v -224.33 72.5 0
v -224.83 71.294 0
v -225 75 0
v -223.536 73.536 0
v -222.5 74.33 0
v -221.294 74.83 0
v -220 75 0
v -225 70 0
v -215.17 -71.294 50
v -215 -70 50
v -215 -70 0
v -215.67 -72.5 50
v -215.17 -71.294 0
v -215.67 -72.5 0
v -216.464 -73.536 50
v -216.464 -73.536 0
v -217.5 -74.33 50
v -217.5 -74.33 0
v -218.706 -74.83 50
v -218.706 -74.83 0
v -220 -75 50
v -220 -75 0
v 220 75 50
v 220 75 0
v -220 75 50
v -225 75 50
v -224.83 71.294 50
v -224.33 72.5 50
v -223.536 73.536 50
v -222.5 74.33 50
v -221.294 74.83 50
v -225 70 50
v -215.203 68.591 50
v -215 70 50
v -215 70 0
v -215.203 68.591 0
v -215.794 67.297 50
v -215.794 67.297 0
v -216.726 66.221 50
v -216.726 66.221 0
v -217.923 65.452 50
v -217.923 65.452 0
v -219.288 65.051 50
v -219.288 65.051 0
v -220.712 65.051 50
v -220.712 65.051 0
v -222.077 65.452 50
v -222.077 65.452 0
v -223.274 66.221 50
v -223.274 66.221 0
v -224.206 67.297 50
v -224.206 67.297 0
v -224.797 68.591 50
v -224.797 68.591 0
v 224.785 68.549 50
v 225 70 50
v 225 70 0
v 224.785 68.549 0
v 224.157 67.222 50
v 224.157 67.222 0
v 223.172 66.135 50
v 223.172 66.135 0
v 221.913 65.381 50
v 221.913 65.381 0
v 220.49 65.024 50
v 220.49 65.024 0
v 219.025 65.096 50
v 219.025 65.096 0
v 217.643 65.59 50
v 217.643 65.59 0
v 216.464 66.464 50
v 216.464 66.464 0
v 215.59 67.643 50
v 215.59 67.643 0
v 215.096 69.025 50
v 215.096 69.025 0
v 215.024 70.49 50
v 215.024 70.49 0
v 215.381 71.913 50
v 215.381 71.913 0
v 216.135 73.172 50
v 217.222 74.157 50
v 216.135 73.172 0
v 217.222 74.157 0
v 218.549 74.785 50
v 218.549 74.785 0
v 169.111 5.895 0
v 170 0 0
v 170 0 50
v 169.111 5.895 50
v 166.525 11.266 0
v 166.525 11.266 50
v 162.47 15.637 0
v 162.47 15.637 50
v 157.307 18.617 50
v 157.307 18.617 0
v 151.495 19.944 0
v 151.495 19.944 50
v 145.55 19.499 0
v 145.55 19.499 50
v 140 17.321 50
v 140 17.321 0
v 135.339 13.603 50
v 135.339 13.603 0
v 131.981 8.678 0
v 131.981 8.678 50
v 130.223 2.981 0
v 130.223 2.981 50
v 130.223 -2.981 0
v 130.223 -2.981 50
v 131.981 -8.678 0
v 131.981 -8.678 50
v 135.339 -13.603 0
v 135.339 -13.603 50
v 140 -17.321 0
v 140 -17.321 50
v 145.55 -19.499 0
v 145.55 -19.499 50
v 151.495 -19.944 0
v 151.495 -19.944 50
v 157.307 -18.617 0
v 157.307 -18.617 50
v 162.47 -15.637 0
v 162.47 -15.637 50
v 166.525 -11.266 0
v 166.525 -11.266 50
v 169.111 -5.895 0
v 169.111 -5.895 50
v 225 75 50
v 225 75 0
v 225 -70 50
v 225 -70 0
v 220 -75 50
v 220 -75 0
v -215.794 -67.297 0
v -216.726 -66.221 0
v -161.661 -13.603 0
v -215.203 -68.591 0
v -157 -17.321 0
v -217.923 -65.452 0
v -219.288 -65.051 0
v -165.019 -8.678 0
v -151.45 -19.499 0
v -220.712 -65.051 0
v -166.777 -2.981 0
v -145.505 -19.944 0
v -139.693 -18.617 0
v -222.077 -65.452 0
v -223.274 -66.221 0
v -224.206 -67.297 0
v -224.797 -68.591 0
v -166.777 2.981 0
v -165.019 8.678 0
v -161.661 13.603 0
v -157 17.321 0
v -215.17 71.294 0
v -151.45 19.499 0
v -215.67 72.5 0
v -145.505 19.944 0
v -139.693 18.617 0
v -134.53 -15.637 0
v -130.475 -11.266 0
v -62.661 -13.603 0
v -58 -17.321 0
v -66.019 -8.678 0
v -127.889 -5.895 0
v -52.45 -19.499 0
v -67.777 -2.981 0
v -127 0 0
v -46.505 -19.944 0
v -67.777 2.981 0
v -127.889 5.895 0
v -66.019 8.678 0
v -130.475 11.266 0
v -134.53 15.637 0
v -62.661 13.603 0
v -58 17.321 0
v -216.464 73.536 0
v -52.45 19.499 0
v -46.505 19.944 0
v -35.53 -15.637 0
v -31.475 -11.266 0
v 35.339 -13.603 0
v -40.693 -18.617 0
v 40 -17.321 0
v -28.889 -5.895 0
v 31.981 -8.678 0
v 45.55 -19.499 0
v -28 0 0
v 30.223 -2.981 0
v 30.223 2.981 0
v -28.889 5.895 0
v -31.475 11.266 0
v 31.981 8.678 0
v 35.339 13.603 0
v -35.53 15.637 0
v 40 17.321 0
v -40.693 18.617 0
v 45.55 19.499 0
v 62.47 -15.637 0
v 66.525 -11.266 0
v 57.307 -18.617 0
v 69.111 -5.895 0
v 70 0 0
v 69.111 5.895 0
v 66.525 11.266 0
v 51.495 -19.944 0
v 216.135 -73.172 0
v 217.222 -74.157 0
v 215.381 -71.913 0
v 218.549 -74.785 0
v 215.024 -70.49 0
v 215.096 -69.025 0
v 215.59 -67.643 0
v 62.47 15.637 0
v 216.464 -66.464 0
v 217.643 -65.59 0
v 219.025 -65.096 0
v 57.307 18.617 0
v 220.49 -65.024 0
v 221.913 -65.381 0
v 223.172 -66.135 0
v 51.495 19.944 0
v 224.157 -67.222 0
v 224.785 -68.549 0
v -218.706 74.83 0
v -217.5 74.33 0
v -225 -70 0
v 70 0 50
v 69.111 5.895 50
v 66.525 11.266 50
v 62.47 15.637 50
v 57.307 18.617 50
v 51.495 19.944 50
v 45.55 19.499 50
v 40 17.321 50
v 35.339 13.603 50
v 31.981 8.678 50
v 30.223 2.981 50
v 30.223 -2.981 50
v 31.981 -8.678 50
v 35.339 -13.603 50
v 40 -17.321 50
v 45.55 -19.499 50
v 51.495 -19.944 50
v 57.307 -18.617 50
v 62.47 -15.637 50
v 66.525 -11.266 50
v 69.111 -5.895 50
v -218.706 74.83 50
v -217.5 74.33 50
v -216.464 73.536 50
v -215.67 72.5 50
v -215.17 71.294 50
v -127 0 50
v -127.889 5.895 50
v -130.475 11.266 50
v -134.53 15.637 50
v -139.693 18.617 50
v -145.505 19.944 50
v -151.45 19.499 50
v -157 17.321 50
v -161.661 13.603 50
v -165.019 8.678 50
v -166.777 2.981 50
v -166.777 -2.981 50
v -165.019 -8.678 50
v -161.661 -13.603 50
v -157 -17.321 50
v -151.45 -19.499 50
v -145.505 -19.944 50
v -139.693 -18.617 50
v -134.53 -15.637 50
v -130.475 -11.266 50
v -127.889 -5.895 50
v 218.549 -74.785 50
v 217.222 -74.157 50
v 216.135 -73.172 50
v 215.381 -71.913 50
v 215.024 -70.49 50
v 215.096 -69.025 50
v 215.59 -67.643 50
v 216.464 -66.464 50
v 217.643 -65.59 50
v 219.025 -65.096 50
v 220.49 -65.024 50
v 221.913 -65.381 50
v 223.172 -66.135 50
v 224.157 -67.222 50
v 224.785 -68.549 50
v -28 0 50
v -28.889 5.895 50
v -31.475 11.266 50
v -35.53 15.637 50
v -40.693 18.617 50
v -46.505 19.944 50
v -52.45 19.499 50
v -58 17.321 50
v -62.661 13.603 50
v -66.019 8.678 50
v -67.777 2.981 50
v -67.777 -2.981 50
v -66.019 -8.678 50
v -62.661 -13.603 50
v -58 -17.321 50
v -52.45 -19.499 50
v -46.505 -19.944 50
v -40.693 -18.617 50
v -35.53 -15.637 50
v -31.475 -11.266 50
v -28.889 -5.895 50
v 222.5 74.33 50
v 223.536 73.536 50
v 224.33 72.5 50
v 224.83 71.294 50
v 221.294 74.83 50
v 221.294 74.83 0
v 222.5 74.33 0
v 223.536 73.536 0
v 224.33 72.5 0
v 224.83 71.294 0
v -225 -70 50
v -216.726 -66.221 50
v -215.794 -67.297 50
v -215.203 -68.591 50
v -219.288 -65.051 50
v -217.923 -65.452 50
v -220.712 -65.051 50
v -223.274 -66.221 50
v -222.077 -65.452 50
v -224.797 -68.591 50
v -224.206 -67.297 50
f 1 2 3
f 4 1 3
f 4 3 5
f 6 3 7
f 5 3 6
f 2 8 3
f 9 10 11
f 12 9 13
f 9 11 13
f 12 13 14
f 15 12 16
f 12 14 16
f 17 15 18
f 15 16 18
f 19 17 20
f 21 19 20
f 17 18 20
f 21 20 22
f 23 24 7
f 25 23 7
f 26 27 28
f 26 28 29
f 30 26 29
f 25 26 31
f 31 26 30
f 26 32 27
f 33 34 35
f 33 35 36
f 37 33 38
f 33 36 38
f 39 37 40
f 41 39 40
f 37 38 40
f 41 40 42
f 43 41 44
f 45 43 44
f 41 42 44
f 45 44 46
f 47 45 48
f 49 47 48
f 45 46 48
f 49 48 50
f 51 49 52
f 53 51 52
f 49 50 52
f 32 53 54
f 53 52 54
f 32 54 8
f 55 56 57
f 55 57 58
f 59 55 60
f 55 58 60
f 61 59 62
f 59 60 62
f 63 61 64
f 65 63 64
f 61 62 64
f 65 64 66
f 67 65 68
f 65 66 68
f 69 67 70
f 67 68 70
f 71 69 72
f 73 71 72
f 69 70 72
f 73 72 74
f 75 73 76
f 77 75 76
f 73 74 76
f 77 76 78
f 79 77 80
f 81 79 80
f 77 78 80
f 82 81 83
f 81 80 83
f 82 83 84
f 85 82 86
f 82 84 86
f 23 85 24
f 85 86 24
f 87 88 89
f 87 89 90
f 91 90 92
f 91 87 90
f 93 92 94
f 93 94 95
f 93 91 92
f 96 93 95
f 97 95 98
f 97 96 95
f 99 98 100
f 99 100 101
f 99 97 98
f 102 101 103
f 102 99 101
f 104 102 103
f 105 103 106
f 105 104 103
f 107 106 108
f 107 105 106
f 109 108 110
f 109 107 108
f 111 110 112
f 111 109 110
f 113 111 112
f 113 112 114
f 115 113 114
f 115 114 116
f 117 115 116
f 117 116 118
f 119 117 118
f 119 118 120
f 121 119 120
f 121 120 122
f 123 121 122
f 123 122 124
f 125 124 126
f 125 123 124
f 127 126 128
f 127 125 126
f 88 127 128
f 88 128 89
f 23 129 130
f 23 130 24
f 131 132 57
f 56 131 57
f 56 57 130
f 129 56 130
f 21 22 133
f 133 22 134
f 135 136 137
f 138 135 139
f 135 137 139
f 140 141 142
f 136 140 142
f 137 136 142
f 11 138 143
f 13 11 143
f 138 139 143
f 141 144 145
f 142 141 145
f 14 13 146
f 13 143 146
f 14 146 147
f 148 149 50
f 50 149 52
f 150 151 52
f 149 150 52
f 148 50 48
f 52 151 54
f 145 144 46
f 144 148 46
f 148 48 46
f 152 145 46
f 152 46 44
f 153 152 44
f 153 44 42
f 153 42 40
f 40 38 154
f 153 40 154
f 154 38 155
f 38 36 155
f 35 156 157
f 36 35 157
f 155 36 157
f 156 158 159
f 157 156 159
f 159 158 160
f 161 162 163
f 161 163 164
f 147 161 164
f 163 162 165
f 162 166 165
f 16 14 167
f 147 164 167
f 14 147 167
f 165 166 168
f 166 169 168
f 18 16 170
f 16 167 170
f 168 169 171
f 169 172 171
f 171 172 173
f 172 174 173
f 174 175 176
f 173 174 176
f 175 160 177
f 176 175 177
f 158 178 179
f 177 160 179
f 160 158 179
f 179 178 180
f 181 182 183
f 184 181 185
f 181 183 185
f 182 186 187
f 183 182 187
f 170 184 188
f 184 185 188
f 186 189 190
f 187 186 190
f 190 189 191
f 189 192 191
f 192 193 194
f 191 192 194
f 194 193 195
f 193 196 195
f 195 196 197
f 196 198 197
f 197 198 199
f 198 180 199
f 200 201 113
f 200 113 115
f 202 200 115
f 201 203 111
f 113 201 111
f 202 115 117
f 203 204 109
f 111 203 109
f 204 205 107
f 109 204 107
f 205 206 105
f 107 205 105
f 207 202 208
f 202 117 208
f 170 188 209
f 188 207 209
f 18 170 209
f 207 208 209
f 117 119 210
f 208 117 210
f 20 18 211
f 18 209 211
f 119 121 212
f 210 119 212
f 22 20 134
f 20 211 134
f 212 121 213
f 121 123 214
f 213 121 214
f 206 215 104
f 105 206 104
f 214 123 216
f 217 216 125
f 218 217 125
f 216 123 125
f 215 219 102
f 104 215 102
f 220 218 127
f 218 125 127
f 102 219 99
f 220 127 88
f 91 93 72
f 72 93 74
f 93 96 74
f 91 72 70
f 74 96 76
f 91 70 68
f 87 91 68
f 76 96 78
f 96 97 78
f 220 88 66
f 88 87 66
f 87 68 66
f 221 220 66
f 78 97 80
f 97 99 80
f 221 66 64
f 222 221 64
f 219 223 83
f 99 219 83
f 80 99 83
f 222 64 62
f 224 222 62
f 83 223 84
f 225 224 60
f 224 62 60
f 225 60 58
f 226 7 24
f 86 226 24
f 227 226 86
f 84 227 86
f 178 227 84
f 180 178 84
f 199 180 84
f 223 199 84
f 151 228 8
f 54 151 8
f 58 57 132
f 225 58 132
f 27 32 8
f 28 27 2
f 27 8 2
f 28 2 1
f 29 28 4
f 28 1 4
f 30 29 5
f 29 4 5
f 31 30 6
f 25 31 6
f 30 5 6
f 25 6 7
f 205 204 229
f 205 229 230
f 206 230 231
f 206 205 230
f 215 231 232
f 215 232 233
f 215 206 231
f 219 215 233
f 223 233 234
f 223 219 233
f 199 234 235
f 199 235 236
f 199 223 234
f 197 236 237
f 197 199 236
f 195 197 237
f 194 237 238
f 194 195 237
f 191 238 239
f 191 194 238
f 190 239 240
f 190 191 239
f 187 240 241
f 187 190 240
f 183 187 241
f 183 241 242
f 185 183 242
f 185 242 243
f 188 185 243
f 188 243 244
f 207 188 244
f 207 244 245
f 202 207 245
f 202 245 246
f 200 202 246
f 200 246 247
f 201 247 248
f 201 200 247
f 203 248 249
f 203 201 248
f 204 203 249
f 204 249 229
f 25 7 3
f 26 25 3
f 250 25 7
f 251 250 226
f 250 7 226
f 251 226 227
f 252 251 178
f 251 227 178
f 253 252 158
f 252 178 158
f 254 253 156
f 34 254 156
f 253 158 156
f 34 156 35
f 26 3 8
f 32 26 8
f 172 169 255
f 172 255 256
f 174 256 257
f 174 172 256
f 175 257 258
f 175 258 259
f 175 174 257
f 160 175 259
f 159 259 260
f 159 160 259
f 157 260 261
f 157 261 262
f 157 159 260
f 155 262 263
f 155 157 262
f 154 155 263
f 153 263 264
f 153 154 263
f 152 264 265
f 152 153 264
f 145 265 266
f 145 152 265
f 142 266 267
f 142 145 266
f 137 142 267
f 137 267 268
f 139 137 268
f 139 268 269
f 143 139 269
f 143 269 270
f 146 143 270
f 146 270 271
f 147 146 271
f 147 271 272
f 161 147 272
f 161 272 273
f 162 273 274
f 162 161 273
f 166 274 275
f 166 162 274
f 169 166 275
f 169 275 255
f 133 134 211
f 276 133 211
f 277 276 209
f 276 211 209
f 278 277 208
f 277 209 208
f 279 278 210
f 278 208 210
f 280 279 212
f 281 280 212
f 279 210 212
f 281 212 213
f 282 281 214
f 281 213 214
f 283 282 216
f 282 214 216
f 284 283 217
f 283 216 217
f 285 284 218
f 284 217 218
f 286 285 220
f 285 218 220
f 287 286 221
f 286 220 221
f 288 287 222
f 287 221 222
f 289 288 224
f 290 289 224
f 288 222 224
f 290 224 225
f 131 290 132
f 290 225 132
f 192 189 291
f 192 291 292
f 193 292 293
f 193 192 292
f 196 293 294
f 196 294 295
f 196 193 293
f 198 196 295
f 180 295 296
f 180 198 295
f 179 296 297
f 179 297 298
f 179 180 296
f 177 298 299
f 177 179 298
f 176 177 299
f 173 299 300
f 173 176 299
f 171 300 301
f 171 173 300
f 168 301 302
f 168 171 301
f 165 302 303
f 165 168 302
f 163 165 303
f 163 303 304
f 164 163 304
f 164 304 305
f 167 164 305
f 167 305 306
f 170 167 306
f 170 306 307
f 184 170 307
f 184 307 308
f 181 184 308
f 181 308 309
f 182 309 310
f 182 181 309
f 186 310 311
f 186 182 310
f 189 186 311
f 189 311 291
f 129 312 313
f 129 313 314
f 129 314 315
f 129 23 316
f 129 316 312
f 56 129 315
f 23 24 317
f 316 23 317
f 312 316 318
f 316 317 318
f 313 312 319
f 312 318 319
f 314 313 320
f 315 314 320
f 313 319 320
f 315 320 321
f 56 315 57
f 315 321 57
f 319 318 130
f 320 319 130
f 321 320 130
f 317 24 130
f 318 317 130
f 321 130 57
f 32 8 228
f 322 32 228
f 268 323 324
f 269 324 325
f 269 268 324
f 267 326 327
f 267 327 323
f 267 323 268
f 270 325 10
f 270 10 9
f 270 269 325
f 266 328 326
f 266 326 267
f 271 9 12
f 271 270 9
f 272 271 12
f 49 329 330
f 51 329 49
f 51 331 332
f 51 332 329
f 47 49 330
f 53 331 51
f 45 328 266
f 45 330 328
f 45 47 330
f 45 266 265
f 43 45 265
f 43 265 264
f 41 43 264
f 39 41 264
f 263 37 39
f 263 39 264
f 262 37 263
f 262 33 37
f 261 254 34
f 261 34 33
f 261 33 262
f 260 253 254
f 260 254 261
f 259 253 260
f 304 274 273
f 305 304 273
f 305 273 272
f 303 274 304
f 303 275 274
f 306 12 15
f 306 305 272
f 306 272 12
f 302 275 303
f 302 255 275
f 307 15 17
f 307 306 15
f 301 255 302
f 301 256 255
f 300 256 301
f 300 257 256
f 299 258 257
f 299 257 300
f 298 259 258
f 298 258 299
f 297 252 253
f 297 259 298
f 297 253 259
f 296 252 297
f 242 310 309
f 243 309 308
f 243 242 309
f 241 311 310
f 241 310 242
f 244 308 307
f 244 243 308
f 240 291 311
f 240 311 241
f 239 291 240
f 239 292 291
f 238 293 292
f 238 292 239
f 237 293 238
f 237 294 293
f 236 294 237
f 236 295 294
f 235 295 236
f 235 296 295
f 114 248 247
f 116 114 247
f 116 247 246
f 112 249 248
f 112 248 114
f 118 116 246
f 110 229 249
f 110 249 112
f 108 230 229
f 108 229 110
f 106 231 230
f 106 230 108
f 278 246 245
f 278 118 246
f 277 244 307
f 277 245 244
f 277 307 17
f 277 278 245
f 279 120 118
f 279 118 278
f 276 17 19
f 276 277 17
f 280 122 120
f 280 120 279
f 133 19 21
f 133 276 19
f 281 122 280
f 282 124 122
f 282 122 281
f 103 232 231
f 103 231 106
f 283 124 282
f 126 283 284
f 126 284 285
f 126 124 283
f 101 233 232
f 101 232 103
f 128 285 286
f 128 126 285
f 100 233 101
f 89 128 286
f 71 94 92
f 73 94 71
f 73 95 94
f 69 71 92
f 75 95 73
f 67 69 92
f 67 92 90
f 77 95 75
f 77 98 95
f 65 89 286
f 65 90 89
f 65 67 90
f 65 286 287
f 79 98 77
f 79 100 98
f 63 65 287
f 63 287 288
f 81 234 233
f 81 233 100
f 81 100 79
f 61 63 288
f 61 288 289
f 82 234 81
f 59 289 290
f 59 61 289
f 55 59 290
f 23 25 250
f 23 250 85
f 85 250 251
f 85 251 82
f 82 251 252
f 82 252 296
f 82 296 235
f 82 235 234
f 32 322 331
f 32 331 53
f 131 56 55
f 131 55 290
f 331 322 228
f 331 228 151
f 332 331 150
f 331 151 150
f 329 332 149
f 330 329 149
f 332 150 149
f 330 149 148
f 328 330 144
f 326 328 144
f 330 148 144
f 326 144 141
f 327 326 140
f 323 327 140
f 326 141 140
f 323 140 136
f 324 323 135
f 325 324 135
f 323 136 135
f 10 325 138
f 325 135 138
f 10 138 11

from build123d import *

# Parameters (mm, degrees)
F1_DEPTH = 50
F0_R     = 20


with BuildPart() as f1:
    # F0 (on Top) → F1 (new body)
    with BuildSketch(Plane.XY):
        with BuildLine():
            Line((-220, 75), (-225, 75))
            Line((-225, 75), (-225, 70))
            ThreePointArc((-225, 70), (-223.5355339059, 73.5355339059), (-220, 75))
        make_face()
    extrude(amount=F1_DEPTH)


with BuildPart() as f1b:
    # F0 (on Top) → F1, piece 2 (new body)
    with BuildSketch(Plane.XY):
        with BuildLine():
            Line((219.9999999506, 75), (-220, 75))
            ThreePointArc((-220, 75), (-216.4644660941, 73.5355339059), (-215, 70))
            ThreePointArc((-215, 70), (-220, 65), (-225, 70))
            Line((-225, 70), (-225, -70))
            ThreePointArc((-225, -70), (-220, -65), (-215, -70))
            ThreePointArc((-215, -70), (-216.4644660941, -73.5355339059), (-220, -75))
            Line((-220, -75), (220, -75))
            ThreePointArc((220, -75), (216.4644660941, -66.4644660941), (225, -70))
            Line((225, -70), (225, 70))
            ThreePointArc((225, 70), (216.4644661115, 66.4644660766), (219.9999999506, 75))
        make_face()
        with Locations((-147, 0)):
            Circle(F0_R, mode=Mode.SUBTRACT)
        with Locations((-48, 0)):
            Circle(F0_R, mode=Mode.SUBTRACT)
        with Locations((50, 0)):
            Circle(F0_R, mode=Mode.SUBTRACT)
        with Locations((150, 0)):
            Circle(F0_R, mode=Mode.SUBTRACT)
    extrude(amount=F1_DEPTH)


with BuildPart() as f1c:
    # F0 (on Top) → F1, piece 3 (new body)
    with BuildSketch(Plane.XY):
        with BuildLine():
            Line((225, 75), (219.9999999506, 75))
            ThreePointArc((219.9999999506, 75), (223.5355338885, 73.5355339234), (225, 70))
            Line((225, 70), (225, 75))
        make_face()
    extrude(amount=F1_DEPTH)


solid = Compound([f1.part, f1b.part, f1c.part])
